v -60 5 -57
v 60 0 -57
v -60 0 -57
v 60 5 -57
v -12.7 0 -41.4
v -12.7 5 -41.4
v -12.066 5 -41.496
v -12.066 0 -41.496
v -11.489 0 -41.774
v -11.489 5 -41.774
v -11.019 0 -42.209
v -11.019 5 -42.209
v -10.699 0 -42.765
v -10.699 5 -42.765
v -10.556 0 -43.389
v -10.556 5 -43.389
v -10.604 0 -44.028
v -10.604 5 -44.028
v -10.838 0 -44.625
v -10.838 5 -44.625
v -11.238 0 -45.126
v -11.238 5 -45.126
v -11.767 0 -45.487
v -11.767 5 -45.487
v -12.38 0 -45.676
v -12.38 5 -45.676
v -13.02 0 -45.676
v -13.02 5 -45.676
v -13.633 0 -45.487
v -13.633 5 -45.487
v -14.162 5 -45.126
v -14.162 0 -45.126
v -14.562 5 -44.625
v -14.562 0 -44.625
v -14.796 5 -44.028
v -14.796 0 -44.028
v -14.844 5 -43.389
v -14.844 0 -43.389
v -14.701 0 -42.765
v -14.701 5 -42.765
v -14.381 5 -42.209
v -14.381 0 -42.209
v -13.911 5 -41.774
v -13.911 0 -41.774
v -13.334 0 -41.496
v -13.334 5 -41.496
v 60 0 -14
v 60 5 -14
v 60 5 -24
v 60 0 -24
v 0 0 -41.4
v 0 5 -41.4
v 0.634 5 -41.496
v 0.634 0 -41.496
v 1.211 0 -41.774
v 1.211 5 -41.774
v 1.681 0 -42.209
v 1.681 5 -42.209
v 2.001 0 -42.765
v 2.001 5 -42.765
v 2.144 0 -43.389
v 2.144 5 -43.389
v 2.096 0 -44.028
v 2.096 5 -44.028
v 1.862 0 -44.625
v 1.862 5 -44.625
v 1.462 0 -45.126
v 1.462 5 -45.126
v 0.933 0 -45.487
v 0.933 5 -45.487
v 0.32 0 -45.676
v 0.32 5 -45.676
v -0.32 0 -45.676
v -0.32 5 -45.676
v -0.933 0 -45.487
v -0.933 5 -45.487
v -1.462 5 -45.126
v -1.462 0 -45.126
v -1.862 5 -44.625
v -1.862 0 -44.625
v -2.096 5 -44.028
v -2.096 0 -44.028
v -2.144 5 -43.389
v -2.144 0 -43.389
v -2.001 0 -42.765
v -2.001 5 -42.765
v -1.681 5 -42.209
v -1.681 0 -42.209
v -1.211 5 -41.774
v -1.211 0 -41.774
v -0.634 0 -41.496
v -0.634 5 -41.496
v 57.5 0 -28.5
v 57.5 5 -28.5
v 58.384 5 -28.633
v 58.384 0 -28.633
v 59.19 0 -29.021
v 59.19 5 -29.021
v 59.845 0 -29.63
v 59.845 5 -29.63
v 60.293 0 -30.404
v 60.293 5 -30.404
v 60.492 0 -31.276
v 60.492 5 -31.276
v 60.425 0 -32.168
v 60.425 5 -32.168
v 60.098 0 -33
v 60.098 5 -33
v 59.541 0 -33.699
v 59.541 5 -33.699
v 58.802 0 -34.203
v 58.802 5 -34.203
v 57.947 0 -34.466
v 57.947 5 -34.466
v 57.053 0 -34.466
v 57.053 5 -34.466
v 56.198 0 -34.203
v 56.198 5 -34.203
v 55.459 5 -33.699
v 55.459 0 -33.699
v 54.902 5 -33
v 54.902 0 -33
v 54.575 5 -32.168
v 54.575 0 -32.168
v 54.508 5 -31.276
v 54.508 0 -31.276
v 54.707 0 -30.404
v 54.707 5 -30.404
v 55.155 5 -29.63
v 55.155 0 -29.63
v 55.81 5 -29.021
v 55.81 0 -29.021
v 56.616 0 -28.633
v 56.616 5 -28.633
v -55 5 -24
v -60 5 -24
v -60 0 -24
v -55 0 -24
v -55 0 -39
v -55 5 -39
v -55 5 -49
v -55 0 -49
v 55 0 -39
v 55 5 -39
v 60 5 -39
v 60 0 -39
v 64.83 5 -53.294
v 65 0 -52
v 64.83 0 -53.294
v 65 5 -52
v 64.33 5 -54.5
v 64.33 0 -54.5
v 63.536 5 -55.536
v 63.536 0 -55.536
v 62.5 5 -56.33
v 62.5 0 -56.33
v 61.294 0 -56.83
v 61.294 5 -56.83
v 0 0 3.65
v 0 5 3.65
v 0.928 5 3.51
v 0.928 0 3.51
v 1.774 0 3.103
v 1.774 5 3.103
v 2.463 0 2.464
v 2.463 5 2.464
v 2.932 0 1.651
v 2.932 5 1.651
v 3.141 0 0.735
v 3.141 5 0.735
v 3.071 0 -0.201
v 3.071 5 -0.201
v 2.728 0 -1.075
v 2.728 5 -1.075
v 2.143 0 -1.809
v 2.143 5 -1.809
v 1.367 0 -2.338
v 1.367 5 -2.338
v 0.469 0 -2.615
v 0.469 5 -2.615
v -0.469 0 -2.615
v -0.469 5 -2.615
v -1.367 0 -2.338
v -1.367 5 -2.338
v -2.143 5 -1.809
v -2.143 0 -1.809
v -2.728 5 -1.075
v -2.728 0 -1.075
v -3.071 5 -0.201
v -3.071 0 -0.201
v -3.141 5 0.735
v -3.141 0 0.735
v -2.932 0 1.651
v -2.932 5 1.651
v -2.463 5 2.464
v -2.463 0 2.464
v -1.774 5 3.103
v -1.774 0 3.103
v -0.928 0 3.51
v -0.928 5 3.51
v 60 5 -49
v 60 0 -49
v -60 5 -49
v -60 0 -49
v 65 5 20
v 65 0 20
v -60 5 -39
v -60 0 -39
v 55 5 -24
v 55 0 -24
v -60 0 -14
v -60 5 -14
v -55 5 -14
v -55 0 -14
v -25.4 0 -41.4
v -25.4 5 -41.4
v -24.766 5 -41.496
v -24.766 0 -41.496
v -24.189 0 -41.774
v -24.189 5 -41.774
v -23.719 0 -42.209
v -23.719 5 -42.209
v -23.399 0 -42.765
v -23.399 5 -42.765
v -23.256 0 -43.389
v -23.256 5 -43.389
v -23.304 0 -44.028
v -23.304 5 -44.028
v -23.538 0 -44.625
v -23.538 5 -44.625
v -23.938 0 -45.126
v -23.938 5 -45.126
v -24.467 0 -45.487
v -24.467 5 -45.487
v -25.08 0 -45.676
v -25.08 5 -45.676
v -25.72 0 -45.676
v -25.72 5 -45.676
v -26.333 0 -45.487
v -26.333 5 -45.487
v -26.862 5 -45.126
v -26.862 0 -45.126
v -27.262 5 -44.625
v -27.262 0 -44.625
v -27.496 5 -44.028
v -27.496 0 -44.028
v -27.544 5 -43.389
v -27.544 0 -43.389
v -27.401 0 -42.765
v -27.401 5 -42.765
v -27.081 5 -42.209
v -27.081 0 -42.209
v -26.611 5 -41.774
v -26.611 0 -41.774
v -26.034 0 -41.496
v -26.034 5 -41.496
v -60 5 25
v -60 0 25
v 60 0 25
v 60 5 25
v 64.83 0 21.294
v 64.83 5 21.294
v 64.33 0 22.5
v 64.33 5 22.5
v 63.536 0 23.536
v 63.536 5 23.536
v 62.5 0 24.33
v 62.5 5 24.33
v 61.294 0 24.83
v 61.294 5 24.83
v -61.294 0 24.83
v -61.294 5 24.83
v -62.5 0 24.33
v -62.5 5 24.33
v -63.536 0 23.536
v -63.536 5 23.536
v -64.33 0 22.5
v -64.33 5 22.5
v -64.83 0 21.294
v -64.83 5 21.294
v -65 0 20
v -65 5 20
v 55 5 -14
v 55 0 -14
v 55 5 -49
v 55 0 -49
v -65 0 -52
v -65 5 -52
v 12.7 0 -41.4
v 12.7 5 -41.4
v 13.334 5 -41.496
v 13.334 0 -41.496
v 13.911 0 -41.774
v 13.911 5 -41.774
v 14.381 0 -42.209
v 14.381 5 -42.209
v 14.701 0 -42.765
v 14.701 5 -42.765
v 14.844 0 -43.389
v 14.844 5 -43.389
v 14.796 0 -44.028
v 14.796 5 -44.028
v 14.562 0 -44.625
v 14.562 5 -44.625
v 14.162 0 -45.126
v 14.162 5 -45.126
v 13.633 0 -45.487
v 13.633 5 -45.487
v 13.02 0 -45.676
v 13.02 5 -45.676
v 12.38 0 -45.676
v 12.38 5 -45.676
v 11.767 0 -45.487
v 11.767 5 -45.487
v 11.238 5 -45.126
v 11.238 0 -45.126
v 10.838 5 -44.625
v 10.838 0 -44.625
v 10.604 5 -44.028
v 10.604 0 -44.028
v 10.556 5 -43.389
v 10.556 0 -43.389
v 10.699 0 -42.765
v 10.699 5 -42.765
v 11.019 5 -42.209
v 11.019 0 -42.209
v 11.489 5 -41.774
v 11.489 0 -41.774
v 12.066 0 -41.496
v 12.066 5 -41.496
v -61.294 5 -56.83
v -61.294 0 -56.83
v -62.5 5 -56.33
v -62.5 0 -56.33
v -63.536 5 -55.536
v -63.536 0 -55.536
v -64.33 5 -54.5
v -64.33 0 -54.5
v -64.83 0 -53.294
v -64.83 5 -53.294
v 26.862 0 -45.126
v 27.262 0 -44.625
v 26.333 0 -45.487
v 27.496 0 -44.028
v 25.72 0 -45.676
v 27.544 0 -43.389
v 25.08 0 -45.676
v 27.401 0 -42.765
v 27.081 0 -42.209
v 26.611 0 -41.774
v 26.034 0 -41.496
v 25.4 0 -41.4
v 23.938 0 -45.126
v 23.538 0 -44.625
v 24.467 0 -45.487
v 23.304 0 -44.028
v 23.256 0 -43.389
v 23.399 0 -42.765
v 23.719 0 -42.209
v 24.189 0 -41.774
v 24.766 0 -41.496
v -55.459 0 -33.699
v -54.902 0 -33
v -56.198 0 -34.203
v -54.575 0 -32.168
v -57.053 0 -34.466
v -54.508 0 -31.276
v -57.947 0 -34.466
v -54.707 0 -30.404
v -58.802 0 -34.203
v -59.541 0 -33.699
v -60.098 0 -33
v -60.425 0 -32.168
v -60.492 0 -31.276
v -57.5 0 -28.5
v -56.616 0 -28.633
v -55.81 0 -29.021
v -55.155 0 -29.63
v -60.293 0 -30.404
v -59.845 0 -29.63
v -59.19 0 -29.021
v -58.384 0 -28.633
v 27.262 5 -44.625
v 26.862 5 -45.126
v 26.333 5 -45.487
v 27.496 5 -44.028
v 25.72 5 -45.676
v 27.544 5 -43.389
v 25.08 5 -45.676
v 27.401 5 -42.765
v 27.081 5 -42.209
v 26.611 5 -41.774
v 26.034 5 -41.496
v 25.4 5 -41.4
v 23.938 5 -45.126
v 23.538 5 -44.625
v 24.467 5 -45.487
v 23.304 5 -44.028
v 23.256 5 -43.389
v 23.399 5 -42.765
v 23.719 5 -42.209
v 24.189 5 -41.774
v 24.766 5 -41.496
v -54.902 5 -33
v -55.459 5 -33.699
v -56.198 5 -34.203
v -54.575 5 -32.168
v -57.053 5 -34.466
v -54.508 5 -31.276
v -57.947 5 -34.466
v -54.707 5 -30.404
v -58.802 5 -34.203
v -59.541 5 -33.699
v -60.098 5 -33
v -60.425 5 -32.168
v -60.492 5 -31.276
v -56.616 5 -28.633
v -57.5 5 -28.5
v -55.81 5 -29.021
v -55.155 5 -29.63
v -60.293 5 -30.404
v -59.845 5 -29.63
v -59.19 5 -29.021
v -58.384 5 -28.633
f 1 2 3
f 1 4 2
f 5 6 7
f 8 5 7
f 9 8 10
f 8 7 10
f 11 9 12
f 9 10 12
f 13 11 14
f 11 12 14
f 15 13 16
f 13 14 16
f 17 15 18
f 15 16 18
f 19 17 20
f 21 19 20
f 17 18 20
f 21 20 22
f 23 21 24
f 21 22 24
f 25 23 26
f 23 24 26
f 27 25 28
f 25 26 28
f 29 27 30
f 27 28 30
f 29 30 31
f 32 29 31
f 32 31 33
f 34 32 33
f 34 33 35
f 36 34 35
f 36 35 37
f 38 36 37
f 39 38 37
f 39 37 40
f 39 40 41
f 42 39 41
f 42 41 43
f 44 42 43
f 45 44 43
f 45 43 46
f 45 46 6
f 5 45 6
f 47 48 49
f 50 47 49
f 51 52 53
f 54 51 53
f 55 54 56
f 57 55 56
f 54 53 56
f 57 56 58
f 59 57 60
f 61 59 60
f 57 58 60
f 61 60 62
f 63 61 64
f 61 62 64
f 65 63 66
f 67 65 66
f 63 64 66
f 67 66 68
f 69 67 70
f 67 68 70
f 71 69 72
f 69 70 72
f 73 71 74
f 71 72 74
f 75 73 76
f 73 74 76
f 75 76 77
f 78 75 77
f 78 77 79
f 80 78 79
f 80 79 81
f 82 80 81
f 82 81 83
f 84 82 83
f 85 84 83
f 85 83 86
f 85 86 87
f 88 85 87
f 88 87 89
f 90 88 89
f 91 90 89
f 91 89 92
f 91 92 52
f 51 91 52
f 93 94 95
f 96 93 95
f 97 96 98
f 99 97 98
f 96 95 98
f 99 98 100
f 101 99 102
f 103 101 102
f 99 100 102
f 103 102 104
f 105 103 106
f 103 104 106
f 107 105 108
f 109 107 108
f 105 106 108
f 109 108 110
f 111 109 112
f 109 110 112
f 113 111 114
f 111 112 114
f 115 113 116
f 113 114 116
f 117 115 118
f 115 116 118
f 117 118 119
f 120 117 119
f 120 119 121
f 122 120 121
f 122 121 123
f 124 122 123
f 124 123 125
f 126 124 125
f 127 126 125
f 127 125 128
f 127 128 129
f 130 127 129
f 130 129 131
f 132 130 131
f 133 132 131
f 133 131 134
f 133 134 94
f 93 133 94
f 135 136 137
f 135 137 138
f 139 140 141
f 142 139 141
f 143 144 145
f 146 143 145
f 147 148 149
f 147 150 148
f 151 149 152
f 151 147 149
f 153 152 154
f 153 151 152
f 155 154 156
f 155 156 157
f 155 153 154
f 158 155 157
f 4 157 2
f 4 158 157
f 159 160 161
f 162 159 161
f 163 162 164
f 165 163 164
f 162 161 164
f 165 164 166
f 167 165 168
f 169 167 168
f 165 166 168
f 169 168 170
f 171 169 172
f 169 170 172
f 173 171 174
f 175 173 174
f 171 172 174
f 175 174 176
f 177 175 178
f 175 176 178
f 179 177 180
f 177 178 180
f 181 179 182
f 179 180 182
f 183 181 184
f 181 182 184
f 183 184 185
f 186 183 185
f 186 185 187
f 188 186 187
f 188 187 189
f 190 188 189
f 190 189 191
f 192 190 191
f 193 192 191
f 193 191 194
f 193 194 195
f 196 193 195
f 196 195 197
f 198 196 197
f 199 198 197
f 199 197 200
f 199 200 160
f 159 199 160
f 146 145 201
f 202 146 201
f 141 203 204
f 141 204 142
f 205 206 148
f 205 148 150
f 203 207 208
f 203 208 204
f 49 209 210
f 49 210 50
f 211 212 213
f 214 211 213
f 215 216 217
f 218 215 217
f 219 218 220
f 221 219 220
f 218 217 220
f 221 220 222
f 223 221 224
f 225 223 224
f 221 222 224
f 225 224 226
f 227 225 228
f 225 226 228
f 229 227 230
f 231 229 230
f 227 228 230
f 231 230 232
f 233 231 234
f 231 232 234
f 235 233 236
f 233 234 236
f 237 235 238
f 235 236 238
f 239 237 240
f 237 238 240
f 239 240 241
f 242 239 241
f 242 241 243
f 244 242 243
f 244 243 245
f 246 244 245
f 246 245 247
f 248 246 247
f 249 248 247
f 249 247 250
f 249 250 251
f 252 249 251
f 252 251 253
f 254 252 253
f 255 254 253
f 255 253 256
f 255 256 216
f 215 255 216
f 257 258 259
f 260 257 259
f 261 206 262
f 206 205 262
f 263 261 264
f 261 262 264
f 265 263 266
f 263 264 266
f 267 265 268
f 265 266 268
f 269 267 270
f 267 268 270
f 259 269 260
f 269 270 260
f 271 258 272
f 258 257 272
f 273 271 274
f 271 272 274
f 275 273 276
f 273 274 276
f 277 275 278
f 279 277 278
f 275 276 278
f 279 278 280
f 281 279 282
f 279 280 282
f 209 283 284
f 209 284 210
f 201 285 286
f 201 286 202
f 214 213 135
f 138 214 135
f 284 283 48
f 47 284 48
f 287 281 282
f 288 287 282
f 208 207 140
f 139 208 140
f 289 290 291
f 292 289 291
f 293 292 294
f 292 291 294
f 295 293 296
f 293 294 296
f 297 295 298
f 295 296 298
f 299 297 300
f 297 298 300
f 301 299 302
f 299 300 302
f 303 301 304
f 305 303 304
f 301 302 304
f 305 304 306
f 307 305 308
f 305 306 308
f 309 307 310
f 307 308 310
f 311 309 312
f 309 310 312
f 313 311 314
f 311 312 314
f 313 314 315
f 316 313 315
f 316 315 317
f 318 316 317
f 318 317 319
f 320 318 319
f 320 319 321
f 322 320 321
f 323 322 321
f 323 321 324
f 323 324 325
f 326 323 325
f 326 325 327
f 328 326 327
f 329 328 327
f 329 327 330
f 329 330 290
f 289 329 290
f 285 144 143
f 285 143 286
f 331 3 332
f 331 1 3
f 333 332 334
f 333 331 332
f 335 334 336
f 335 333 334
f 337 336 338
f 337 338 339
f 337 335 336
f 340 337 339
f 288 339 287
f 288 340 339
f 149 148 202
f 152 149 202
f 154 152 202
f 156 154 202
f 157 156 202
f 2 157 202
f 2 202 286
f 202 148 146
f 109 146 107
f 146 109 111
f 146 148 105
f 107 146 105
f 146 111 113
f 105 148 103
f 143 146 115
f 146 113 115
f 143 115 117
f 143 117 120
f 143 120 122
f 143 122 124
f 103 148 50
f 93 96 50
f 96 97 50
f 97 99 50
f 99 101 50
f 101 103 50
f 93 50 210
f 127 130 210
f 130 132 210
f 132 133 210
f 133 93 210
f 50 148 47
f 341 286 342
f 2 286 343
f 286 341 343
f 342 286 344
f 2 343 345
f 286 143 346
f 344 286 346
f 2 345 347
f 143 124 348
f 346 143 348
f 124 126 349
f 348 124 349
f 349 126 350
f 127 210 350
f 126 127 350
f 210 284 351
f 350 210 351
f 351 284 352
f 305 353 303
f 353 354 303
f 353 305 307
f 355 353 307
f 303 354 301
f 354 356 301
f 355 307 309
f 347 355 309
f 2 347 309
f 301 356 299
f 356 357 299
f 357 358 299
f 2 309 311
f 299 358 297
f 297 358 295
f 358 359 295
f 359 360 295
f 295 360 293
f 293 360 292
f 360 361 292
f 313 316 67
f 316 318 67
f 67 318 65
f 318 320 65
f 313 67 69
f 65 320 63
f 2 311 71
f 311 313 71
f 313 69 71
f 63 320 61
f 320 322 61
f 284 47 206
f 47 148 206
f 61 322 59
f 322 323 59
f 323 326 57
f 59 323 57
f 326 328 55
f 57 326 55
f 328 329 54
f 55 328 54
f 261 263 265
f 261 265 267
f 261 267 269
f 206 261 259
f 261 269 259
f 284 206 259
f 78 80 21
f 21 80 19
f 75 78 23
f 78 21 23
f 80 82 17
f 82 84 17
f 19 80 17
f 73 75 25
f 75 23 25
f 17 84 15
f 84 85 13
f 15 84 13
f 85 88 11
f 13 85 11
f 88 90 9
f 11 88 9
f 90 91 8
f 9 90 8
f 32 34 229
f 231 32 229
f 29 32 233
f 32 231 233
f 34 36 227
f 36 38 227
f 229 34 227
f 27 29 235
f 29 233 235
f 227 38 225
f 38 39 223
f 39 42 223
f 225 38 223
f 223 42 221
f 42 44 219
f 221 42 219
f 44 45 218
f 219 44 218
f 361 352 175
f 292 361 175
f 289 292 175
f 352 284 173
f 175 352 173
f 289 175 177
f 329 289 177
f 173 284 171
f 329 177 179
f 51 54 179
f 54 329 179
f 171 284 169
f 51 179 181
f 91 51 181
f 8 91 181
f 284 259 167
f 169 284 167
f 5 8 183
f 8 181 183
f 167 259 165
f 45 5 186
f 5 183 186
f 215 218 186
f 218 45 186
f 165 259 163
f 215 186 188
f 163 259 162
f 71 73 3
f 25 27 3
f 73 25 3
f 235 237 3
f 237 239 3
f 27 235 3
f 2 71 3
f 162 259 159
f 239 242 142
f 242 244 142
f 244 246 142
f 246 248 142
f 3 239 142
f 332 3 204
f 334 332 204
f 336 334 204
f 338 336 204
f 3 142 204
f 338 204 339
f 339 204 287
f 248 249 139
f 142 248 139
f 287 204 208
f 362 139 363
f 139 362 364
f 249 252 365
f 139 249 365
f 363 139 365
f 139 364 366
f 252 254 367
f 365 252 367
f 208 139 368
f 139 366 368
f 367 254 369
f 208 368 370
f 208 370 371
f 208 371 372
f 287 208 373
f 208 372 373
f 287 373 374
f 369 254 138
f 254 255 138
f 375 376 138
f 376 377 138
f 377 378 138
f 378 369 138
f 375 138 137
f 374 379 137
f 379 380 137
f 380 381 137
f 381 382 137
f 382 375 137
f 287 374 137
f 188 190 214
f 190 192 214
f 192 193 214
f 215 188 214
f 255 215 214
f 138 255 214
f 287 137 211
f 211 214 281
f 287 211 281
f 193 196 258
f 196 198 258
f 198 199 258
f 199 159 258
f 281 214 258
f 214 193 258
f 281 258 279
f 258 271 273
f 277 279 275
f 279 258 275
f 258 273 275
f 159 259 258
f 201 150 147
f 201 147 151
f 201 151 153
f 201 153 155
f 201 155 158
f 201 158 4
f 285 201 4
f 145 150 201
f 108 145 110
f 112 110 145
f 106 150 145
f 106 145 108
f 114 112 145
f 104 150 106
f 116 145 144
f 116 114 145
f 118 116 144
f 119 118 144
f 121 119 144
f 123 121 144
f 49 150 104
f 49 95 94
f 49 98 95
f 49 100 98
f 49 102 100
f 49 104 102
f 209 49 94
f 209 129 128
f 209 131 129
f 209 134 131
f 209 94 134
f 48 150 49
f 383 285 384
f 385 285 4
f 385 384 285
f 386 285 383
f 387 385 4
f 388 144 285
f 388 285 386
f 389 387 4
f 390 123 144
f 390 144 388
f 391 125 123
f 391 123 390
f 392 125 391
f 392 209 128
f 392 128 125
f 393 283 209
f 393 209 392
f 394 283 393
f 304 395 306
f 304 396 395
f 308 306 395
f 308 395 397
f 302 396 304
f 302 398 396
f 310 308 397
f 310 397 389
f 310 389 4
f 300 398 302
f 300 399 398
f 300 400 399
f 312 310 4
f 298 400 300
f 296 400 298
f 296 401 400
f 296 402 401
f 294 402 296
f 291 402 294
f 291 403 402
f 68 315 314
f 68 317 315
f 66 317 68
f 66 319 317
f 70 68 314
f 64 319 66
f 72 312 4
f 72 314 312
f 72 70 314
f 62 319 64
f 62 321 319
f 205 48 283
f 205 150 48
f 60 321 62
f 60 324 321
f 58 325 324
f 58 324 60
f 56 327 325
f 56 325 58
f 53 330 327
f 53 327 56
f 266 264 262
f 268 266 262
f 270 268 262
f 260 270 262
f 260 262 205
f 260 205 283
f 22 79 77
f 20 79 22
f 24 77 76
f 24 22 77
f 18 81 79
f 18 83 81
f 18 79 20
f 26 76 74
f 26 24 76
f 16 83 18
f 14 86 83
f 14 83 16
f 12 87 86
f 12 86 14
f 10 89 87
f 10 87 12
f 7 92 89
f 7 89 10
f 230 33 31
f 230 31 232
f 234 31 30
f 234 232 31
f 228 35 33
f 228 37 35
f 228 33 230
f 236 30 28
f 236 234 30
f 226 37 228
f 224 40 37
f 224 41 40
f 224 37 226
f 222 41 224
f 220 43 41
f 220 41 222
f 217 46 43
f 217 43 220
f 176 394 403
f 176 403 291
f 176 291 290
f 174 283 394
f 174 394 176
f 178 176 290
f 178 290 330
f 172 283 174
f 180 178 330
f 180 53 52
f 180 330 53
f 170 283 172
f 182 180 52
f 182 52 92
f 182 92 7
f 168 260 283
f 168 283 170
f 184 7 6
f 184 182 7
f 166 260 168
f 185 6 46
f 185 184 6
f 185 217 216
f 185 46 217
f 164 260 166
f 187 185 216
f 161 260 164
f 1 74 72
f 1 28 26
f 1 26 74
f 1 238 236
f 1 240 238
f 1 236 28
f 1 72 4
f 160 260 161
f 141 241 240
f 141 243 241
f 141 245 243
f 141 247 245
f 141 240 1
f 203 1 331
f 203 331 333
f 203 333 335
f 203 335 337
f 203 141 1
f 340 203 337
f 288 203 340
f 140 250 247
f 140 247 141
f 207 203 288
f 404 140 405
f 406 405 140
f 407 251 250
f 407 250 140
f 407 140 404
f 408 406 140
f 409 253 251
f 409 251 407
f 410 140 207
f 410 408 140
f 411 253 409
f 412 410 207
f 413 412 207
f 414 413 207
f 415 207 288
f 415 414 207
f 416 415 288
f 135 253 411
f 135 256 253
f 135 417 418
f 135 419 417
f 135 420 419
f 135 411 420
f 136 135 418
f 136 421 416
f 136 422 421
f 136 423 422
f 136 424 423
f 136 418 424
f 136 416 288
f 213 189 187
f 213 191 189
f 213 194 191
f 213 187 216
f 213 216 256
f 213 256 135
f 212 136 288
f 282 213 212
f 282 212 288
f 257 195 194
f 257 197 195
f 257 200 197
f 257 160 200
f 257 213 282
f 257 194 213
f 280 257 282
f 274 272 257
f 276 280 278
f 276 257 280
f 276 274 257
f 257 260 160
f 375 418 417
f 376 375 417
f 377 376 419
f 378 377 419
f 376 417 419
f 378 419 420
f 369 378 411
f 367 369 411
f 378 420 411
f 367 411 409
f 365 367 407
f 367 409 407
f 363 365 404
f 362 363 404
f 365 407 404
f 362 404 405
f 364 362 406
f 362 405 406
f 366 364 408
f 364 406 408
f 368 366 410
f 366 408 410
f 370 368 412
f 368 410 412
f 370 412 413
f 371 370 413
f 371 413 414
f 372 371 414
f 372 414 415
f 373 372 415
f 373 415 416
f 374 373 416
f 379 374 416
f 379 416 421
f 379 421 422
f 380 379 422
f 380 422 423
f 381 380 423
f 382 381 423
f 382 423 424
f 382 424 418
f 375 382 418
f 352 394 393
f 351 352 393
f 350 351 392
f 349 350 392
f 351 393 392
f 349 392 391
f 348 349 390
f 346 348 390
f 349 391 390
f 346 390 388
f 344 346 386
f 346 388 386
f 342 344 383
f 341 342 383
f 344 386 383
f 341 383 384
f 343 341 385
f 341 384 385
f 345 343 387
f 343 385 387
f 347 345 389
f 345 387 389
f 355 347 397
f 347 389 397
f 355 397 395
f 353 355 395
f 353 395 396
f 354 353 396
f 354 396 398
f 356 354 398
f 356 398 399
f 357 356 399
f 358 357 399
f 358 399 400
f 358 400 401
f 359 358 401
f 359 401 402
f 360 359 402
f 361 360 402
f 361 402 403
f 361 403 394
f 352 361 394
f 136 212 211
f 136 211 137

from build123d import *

# Parameters (mm, degrees)
SKETCH1_W           = 130
SKETCH1_H           = 50
BOSS_EXTRUDE1_DEPTH = 5
SKETCH2_W           = 130
SKETCH2_H           = 5
BOSS_EXTRUDE2_DEPTH = 32
SKETCH3_R           = 3
SKETCH3_W           = 5
SKETCH3_H           = 10
CUT_EXTRUDE1_DEPTH  = 10
FILLET1_R           = 5
CUT_EXTRUDE2_REACH  = 88.597
SKETCH4_R           = 3.15
SKETCH4_R_2         = 2.15


with BuildPart() as part:
    # Sketch1 → Boss-Extrude1 (new body)
    with BuildSketch(Plane(origin=(0, 0, 0), x_dir=(1, 0, 0), z_dir=(0, 1, 0))):
        Rectangle(SKETCH1_W, SKETCH1_H)
    extrude(amount=BOSS_EXTRUDE1_DEPTH)

    # Sketch2 → Boss-Extrude2 (add)
    with BuildSketch(Plane(origin=(0, 0, -25), x_dir=(-1, 0, 0), z_dir=(0, 0, -1))):
        with Locations((0, 2.5)):
            Rectangle(SKETCH2_W, SKETCH2_H)
    extrude(amount=BOSS_EXTRUDE2_DEPTH)

    # Sketch3 → Cut-Extrude1 (cut)
    with BuildSketch(Plane(origin=(0, 5, 0), x_dir=(1, 0, 0), z_dir=(0, 1, 0))):
        with Locations(Location((-57.5, 31.5, 0), (0, 0, 270))):
            Circle(SKETCH3_R)
        with Locations(Location((57.5, 31.5, 0), (0, 0, 270))):
            Circle(SKETCH3_R)
        with Locations((57.5, 44)):
            Rectangle(SKETCH3_W, SKETCH3_H)
        with Locations((-57.5, 19)):
            Rectangle(SKETCH3_W, SKETCH3_H)
        with Locations((-57.5, 44)):
            Rectangle(SKETCH3_W, SKETCH3_H)
        with Locations((57.5, 19)):
            Rectangle(SKETCH3_W, SKETCH3_H)
    extrude(amount=-CUT_EXTRUDE1_DEPTH, mode=Mode.SUBTRACT)

    # Fillet1
    fillet1_edges = [part.edges().sort_by_distance(p)[0] for p in [
        (65, 2.5, -57),
        (-65, 2.5, -57),
        (65, 2.5, 25),
        (-65, 2.5, 25),
    ]]
    fillet(fillet1_edges, radius=FILLET1_R)

    # Sketch4 → Cut-Extrude2 (cut, up to next)
    with BuildSketch(Plane(origin=(0, 5, 0), x_dir=(1, 0, 0), z_dir=(0, 1, 0)), mode=Mode.PRIVATE) as cut_extrude2_sk1:
        with Locations(Location((0, -0.5, 0), (0, 0, 270))):
            Circle(SKETCH4_R)
    cut_extrude2_tool1 = extrude(cut_extrude2_sk1.sketch, amount=-CUT_EXTRUDE2_REACH, mode=Mode.PRIVATE) & part.part
    # Sketch4 → Cut-Extrude2 (cut, up to next)
    with BuildSketch(Plane(origin=(0, 5, 0), x_dir=(1, 0, 0), z_dir=(0, 1, 0)), mode=Mode.PRIVATE) as cut_extrude2_sk2:
        with Locations(Location((25.4, 43.55, 0), (0, 0, 270))):
            Circle(SKETCH4_R_2)
    cut_extrude2_tool2 = extrude(cut_extrude2_sk2.sketch, amount=-CUT_EXTRUDE2_REACH, mode=Mode.PRIVATE) & part.part
    # Sketch4 → Cut-Extrude2 (cut, up to next)
    with BuildSketch(Plane(origin=(0, 5, 0), x_dir=(1, 0, 0), z_dir=(0, 1, 0)), mode=Mode.PRIVATE) as cut_extrude2_sk3:
        with Locations(Location((-25.4, 43.55, 0), (0, 0, 270))):
            Circle(SKETCH4_R_2)
    cut_extrude2_tool3 = extrude(cut_extrude2_sk3.sketch, amount=-CUT_EXTRUDE2_REACH, mode=Mode.PRIVATE) & part.part
    # Sketch4 → Cut-Extrude2 (cut, up to next)
    with BuildSketch(Plane(origin=(0, 5, 0), x_dir=(1, 0, 0), z_dir=(0, 1, 0)), mode=Mode.PRIVATE) as cut_extrude2_sk4:
        with Locations(Location((-12.7, 43.55, 0), (0, 0, 270))):
            Circle(SKETCH4_R_2)
    cut_extrude2_tool4 = extrude(cut_extrude2_sk4.sketch, amount=-CUT_EXTRUDE2_REACH, mode=Mode.PRIVATE) & part.part
    # Sketch4 → Cut-Extrude2 (cut, up to next)
    with BuildSketch(Plane(origin=(0, 5, 0), x_dir=(1, 0, 0), z_dir=(0, 1, 0)), mode=Mode.PRIVATE) as cut_extrude2_sk5:
        with Locations(Location((12.7, 43.55, 0), (0, 0, 270))):
            Circle(SKETCH4_R_2)
    cut_extrude2_tool5 = extrude(cut_extrude2_sk5.sketch, amount=-CUT_EXTRUDE2_REACH, mode=Mode.PRIVATE) & part.part
    # Sketch4 → Cut-Extrude2 (cut, up to next)
    with BuildSketch(Plane(origin=(0, 5, 0), x_dir=(1, 0, 0), z_dir=(0, 1, 0)), mode=Mode.PRIVATE) as cut_extrude2_sk6:
        with Locations(Location((0, 43.55, 0), (0, 0, 270))):
            Circle(SKETCH4_R_2)
    cut_extrude2_tool6 = extrude(cut_extrude2_sk6.sketch, amount=-CUT_EXTRUDE2_REACH, mode=Mode.PRIVATE) & part.part
    add(cut_extrude2_tool1.solids().sort_by_distance((0, 5, 0.5))[0], mode=Mode.SUBTRACT)
    add(cut_extrude2_tool2.solids().sort_by_distance((25.4, 5, -43.55))[0], mode=Mode.SUBTRACT)
    add(cut_extrude2_tool3.solids().sort_by_distance((-25.4, 5, -43.55))[0], mode=Mode.SUBTRACT)
    add(cut_extrude2_tool4.solids().sort_by_distance((-12.7, 5, -43.55))[0], mode=Mode.SUBTRACT)
    add(cut_extrude2_tool5.solids().sort_by_distance((12.7, 5, -43.55))[0], mode=Mode.SUBTRACT)
    add(cut_extrude2_tool6.solids().sort_by_distance((0, 5, -43.55))[0], mode=Mode.SUBTRACT)


solid = part.part
